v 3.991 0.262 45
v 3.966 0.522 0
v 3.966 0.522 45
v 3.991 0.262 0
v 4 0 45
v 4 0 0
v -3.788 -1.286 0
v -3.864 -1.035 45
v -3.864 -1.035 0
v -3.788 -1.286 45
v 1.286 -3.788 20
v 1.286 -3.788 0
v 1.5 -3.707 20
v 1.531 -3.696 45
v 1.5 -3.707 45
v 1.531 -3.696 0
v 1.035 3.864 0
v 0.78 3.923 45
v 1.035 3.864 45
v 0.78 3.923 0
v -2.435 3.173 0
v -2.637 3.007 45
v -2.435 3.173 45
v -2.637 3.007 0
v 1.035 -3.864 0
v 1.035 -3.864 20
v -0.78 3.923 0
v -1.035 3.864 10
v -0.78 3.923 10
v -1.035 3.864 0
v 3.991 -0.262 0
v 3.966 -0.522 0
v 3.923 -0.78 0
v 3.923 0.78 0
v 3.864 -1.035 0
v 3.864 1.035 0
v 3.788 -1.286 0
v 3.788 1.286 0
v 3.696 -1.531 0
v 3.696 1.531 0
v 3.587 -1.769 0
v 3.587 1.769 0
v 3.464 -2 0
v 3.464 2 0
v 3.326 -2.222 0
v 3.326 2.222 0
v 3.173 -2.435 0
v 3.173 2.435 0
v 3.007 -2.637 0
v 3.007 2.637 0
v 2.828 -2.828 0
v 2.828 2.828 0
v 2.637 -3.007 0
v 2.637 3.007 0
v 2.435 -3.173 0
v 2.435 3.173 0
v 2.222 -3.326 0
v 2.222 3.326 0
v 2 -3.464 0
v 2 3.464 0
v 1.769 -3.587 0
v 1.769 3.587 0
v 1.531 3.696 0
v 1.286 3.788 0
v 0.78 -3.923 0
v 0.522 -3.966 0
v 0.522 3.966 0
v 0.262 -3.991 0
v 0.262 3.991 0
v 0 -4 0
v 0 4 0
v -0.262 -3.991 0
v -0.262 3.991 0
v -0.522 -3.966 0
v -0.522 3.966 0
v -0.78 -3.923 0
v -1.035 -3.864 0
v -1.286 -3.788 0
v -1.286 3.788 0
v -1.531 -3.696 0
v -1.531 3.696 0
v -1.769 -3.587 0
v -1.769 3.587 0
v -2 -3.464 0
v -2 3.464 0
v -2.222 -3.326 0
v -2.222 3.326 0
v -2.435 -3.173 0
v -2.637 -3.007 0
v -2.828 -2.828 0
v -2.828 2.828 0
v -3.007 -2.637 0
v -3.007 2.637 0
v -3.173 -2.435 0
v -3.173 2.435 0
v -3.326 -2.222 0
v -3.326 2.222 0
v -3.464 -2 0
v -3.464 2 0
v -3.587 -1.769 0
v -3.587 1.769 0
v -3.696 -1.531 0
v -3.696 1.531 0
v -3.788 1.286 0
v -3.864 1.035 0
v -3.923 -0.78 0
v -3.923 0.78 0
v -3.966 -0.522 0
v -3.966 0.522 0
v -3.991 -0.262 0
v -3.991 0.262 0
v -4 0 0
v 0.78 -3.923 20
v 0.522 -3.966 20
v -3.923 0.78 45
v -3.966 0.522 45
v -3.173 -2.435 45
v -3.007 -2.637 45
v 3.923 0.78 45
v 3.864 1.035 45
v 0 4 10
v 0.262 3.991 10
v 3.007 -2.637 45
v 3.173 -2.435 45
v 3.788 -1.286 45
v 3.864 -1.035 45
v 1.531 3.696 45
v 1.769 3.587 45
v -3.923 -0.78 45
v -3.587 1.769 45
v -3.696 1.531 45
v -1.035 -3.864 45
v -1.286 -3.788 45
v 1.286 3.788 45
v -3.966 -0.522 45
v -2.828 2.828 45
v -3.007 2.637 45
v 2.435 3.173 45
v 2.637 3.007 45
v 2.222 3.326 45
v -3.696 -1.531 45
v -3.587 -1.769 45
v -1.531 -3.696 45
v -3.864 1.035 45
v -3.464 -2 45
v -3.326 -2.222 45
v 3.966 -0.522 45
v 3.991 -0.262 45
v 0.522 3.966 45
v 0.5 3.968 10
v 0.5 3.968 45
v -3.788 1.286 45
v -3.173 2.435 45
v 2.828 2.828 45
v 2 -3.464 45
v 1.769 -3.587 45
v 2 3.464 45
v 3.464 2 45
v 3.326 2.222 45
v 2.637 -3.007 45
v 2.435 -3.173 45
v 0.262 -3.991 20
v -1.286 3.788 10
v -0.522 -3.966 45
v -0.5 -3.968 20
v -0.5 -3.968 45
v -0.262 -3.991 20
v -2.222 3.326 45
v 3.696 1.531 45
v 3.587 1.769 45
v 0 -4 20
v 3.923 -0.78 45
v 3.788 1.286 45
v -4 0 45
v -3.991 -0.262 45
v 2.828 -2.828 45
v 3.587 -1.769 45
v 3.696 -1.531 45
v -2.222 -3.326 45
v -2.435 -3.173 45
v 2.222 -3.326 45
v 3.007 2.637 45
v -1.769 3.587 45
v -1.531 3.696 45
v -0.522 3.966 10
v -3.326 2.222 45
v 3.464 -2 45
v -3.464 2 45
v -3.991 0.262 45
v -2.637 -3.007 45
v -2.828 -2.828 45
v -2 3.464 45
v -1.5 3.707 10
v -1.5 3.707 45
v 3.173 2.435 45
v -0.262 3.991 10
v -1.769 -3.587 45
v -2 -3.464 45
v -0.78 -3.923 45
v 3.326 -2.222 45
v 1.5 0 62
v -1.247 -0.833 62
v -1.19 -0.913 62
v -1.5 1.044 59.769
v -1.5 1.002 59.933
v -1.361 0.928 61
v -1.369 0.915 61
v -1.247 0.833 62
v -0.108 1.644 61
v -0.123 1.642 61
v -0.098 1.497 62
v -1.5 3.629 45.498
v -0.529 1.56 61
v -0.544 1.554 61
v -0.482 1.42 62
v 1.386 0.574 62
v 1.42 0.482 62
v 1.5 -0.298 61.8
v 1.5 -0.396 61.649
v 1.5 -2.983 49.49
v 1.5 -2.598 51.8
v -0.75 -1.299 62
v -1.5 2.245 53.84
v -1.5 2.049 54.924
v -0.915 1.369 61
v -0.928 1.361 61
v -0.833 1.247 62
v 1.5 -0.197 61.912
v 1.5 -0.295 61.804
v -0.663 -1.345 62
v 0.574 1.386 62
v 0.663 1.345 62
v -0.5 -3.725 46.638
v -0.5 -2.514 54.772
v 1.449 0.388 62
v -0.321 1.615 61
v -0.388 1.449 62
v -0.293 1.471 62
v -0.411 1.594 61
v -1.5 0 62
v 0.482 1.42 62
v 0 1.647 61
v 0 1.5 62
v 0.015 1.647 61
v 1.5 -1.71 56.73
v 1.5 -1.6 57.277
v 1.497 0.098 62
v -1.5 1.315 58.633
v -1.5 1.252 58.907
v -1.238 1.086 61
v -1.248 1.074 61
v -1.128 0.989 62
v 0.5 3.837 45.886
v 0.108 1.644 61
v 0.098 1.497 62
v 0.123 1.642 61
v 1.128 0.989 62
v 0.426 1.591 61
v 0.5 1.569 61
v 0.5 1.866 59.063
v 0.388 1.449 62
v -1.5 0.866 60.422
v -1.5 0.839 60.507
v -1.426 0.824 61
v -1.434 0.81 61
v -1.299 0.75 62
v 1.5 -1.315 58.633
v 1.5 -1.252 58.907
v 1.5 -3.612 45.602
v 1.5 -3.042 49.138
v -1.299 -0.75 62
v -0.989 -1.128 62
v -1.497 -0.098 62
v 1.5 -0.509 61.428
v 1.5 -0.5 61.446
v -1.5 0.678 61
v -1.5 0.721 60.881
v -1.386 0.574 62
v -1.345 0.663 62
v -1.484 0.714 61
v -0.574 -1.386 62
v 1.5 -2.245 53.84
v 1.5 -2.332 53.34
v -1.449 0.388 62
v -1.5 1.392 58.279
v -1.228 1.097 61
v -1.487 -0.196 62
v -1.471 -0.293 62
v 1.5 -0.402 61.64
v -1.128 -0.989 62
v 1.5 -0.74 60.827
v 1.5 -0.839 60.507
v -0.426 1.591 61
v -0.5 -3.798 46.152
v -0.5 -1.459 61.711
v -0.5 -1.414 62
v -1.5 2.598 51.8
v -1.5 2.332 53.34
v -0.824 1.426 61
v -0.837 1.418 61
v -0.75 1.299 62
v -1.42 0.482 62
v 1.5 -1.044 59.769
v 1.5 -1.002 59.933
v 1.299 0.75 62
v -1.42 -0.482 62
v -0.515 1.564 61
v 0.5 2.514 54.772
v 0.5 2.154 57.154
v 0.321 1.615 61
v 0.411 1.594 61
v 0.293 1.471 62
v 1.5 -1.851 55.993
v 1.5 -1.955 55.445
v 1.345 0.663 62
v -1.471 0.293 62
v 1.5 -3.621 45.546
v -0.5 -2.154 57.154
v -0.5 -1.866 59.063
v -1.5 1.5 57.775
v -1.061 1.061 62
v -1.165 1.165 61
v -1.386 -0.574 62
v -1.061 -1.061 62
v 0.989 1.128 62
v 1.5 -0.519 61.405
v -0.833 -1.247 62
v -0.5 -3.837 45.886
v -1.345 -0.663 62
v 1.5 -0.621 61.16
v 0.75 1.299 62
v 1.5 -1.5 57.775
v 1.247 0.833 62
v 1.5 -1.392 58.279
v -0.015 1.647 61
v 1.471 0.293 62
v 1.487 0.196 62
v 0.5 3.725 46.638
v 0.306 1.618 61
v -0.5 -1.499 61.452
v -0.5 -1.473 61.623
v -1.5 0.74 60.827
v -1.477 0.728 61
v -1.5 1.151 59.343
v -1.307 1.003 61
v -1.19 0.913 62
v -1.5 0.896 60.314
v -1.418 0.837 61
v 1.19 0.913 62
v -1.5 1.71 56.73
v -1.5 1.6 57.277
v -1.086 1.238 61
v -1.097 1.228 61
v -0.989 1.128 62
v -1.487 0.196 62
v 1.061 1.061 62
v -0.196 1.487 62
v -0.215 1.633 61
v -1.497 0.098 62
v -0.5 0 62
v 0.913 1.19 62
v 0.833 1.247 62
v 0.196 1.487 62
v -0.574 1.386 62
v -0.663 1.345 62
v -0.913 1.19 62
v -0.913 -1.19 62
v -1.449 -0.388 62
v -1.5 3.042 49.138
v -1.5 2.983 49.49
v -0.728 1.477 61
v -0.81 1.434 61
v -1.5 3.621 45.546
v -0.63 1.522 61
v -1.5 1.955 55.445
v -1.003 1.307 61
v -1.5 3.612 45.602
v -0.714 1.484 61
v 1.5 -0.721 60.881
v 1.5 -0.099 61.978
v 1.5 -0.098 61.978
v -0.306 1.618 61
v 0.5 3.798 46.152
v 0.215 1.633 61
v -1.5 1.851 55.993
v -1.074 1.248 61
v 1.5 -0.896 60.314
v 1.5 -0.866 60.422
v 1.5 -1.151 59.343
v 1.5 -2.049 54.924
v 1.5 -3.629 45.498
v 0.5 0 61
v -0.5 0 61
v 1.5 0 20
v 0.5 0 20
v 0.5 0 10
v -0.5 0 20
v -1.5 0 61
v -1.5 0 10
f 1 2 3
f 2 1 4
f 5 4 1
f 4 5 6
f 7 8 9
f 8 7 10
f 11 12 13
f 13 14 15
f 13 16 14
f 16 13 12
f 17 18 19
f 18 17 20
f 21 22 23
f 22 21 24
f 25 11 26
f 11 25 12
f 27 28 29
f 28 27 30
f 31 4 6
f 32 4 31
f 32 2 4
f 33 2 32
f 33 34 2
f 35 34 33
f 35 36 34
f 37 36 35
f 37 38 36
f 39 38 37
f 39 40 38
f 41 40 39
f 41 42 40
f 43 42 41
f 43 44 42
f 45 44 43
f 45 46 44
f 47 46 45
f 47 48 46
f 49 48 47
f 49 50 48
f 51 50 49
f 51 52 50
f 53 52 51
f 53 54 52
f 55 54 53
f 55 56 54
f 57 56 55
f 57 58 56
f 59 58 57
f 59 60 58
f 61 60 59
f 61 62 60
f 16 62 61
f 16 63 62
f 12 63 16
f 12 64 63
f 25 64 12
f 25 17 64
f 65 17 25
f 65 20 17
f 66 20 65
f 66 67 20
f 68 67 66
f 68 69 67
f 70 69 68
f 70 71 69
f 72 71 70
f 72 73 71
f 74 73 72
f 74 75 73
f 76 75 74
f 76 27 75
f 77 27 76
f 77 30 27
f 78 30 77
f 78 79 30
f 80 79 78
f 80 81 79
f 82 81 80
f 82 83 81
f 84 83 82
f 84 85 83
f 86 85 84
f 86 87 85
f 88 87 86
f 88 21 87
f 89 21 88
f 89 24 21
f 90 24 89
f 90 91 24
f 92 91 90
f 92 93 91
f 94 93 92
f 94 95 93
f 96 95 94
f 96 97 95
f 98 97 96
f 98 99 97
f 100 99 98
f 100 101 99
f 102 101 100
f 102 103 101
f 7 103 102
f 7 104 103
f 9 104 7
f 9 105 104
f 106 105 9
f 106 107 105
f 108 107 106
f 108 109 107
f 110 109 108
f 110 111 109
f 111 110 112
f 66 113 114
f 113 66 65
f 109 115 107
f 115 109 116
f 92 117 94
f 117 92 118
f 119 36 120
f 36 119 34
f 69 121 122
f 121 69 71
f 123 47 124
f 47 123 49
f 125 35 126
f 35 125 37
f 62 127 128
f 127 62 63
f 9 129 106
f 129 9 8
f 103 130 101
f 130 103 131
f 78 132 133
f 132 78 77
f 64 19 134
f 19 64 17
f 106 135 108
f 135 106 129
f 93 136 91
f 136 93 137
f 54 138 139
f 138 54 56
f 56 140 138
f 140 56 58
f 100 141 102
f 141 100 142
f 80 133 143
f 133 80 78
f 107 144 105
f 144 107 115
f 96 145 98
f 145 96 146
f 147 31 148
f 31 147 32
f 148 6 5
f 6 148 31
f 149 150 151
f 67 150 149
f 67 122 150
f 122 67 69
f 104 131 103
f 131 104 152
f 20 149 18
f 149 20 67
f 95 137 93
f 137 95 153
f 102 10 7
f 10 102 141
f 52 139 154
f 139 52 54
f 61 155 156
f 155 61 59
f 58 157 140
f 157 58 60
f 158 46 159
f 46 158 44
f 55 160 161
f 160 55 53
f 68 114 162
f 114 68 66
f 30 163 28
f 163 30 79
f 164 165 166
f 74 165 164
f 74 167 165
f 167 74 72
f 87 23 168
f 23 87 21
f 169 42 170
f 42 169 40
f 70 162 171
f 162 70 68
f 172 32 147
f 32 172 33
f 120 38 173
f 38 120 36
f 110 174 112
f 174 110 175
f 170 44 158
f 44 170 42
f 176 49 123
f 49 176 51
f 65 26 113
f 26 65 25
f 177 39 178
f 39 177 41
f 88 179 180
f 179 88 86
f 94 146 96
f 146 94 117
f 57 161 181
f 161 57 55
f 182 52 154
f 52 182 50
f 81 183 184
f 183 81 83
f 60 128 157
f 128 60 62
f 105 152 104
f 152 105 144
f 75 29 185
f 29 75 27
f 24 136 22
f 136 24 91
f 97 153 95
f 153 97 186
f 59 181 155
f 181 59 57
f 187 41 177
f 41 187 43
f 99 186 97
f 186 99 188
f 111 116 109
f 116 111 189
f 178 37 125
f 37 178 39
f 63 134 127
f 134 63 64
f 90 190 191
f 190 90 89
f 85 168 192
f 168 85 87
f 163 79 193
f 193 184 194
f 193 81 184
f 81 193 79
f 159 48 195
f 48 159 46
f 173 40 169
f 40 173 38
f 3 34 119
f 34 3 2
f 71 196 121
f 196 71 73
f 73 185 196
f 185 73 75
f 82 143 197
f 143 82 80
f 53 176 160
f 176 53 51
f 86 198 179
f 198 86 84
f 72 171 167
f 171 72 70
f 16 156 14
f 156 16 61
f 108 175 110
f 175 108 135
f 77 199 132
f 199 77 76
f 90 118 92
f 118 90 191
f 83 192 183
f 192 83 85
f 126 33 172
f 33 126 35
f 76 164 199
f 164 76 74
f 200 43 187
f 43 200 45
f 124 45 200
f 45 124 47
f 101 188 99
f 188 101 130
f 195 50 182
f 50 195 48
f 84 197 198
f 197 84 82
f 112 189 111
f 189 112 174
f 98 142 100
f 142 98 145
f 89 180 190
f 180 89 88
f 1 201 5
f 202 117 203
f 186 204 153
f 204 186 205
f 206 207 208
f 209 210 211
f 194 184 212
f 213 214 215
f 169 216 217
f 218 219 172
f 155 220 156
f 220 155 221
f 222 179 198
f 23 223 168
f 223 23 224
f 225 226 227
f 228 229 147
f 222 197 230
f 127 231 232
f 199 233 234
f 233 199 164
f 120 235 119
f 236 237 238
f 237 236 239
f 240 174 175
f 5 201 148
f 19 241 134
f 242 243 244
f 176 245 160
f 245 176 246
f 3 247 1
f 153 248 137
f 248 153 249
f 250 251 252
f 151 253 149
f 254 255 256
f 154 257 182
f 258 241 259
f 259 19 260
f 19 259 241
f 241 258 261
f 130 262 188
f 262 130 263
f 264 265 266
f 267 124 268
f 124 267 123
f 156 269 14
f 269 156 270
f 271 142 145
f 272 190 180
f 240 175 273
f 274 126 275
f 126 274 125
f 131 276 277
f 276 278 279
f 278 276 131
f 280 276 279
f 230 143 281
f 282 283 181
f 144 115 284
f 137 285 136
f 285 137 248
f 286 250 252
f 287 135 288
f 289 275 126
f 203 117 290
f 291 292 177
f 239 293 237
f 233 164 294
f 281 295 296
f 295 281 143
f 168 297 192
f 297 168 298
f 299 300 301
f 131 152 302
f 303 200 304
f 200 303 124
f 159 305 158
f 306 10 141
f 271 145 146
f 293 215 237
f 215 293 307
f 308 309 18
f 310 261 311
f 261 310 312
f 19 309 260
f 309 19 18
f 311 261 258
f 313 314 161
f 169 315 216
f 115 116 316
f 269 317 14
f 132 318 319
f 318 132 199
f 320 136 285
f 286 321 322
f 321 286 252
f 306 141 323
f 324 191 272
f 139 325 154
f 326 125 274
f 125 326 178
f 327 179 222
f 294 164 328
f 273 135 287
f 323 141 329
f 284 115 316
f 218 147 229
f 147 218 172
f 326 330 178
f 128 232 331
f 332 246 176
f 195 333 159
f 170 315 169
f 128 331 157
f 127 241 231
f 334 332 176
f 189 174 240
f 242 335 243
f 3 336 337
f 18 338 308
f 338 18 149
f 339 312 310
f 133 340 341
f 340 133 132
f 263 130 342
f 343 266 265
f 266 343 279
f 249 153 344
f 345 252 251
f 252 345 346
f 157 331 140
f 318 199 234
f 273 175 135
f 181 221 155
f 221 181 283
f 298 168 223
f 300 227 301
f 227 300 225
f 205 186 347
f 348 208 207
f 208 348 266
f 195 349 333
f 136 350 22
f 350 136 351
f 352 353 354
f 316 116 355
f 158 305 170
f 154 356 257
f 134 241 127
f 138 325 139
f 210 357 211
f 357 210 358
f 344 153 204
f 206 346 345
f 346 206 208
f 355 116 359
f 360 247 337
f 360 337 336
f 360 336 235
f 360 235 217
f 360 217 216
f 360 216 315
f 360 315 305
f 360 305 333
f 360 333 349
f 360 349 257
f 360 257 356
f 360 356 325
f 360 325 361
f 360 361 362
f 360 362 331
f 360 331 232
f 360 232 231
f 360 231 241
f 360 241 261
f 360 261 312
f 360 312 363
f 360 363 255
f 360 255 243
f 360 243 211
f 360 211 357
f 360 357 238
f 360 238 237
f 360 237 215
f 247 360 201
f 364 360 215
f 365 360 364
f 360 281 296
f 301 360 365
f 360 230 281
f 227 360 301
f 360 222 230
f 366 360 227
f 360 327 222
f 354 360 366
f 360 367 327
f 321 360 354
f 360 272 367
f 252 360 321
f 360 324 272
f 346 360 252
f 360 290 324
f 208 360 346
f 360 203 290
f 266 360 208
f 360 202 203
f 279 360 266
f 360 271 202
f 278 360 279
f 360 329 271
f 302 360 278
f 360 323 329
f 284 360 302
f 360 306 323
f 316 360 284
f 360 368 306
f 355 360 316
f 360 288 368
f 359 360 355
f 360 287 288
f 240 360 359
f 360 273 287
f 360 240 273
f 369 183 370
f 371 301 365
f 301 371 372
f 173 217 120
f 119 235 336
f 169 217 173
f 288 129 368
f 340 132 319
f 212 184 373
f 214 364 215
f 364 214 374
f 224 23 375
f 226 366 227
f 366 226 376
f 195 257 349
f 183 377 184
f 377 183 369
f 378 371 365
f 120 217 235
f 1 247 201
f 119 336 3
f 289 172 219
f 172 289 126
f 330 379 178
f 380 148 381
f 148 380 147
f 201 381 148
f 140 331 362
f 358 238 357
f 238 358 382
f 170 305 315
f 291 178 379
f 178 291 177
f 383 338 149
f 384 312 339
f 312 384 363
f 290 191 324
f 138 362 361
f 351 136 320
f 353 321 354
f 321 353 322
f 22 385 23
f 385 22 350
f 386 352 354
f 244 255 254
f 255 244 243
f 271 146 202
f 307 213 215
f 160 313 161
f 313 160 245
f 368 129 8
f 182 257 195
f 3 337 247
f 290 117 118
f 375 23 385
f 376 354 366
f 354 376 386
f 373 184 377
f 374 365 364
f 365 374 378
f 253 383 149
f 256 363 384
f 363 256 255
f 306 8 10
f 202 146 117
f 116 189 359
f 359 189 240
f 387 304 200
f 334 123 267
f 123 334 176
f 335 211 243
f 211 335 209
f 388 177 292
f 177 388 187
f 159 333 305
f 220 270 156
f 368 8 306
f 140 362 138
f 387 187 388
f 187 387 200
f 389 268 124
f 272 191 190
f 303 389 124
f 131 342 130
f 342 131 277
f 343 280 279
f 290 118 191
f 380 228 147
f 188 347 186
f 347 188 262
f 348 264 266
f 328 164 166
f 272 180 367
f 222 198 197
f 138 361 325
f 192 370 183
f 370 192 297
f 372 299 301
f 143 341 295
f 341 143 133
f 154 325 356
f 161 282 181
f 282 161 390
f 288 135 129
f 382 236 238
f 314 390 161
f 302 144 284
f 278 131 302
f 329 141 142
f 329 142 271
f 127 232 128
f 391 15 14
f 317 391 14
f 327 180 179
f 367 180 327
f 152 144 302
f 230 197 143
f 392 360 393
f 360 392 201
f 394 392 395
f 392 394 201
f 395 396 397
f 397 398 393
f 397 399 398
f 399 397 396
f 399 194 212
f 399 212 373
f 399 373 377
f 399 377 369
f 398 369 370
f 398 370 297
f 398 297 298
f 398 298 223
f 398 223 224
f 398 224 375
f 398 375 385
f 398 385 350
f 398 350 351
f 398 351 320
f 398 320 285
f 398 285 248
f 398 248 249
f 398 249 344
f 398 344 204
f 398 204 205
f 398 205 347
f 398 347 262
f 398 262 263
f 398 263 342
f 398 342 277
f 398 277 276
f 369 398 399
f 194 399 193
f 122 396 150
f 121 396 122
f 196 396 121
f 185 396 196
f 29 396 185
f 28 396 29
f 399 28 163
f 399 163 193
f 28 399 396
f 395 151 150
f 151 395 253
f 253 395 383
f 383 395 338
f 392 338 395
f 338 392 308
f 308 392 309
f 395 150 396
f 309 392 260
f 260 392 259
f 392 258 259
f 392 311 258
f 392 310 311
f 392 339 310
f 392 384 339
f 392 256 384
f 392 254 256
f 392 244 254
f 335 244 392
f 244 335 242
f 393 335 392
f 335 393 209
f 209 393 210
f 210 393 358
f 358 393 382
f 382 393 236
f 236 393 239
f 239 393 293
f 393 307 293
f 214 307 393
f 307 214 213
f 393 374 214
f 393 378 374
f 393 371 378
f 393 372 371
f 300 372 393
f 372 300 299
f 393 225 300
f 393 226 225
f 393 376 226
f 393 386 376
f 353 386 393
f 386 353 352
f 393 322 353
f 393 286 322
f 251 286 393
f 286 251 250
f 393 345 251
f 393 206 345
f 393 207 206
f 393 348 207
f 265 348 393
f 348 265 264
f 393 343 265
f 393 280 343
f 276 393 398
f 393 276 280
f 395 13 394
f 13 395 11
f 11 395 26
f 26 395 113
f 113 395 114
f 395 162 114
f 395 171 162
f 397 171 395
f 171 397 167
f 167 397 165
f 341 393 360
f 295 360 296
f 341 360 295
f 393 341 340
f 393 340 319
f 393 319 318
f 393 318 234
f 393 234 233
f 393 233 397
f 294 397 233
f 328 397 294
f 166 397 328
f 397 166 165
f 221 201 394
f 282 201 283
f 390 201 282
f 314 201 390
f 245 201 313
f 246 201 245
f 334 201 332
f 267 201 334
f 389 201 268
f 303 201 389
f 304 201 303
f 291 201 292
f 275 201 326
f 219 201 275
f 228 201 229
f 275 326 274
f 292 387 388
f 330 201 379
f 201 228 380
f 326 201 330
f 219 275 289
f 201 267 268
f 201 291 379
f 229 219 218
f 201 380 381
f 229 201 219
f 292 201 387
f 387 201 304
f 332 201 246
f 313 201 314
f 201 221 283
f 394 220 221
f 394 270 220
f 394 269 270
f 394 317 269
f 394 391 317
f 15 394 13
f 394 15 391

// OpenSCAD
// Pestle for grinding tissue inside a 1.5 mL microcentrifuge tube
// Print orientation: standing upright on the bed (z = 0), centred on the origin in X and Y.
// Units: millimetres.

// ---------------- Parameters ----------------
handle_d      = 8;    // handle diameter (also cone base diameter)
handle_h      = 45;   // handle height (z = 0 to z = 45)
cone_d        = 3;    // cone tip diameter (at z = 62)
cone_top_z    = 62;   // z where the cone meets the rounded tip
tip_d         = 3;    // rounded tip diameter (sphere)
tip_z         = 62;   // sphere centre height (z = cone_top_z)
groove_count  = 4;    // number of circumferential grooves on the handle
groove_w      = 2;    // groove width (in Z)
groove_depth  = 1;    // groove depth (in radial thickness / X)
groove_z      = [10, 15, 20, 25]; // groove centre heights
eps           = 0.5;  // overshoot for clean boolean cuts
$fn           = 96;   // curve resolution

// ---------------- Model ----------------
difference() {
    union() {
        // (1) Cylindrical handle
        cylinder(d = handle_d, h = handle_h);

        // (2) Tapering cone: 8 mm at z = 45 -> 3 mm at z = 62
        translate([0, 0, handle_h])
            cylinder(d1 = handle_d, d2 = cone_d, h = cone_top_z - handle_h);

        // (3) Rounded tip: 3 mm diameter sphere centred at z = 62
        translate([0, 0, tip_z - tip_d / 2])
            sphere(d = tip_d);
    }

    // Grip grooves, cut fully through the handle wall
    // (the cylinder above runs from z = 0 to z = 62, so the cuts pass through)
    for (g = [0 : groove_count - 1]) {
        rotate([0, 0, groove_z[g] < 20 ? 90 : -90])
            translate([0, -eps, groove_z[g]])
                cube([handle_d / 2 + eps, groove_w, handle_h + 2 * eps]);
    }
}
